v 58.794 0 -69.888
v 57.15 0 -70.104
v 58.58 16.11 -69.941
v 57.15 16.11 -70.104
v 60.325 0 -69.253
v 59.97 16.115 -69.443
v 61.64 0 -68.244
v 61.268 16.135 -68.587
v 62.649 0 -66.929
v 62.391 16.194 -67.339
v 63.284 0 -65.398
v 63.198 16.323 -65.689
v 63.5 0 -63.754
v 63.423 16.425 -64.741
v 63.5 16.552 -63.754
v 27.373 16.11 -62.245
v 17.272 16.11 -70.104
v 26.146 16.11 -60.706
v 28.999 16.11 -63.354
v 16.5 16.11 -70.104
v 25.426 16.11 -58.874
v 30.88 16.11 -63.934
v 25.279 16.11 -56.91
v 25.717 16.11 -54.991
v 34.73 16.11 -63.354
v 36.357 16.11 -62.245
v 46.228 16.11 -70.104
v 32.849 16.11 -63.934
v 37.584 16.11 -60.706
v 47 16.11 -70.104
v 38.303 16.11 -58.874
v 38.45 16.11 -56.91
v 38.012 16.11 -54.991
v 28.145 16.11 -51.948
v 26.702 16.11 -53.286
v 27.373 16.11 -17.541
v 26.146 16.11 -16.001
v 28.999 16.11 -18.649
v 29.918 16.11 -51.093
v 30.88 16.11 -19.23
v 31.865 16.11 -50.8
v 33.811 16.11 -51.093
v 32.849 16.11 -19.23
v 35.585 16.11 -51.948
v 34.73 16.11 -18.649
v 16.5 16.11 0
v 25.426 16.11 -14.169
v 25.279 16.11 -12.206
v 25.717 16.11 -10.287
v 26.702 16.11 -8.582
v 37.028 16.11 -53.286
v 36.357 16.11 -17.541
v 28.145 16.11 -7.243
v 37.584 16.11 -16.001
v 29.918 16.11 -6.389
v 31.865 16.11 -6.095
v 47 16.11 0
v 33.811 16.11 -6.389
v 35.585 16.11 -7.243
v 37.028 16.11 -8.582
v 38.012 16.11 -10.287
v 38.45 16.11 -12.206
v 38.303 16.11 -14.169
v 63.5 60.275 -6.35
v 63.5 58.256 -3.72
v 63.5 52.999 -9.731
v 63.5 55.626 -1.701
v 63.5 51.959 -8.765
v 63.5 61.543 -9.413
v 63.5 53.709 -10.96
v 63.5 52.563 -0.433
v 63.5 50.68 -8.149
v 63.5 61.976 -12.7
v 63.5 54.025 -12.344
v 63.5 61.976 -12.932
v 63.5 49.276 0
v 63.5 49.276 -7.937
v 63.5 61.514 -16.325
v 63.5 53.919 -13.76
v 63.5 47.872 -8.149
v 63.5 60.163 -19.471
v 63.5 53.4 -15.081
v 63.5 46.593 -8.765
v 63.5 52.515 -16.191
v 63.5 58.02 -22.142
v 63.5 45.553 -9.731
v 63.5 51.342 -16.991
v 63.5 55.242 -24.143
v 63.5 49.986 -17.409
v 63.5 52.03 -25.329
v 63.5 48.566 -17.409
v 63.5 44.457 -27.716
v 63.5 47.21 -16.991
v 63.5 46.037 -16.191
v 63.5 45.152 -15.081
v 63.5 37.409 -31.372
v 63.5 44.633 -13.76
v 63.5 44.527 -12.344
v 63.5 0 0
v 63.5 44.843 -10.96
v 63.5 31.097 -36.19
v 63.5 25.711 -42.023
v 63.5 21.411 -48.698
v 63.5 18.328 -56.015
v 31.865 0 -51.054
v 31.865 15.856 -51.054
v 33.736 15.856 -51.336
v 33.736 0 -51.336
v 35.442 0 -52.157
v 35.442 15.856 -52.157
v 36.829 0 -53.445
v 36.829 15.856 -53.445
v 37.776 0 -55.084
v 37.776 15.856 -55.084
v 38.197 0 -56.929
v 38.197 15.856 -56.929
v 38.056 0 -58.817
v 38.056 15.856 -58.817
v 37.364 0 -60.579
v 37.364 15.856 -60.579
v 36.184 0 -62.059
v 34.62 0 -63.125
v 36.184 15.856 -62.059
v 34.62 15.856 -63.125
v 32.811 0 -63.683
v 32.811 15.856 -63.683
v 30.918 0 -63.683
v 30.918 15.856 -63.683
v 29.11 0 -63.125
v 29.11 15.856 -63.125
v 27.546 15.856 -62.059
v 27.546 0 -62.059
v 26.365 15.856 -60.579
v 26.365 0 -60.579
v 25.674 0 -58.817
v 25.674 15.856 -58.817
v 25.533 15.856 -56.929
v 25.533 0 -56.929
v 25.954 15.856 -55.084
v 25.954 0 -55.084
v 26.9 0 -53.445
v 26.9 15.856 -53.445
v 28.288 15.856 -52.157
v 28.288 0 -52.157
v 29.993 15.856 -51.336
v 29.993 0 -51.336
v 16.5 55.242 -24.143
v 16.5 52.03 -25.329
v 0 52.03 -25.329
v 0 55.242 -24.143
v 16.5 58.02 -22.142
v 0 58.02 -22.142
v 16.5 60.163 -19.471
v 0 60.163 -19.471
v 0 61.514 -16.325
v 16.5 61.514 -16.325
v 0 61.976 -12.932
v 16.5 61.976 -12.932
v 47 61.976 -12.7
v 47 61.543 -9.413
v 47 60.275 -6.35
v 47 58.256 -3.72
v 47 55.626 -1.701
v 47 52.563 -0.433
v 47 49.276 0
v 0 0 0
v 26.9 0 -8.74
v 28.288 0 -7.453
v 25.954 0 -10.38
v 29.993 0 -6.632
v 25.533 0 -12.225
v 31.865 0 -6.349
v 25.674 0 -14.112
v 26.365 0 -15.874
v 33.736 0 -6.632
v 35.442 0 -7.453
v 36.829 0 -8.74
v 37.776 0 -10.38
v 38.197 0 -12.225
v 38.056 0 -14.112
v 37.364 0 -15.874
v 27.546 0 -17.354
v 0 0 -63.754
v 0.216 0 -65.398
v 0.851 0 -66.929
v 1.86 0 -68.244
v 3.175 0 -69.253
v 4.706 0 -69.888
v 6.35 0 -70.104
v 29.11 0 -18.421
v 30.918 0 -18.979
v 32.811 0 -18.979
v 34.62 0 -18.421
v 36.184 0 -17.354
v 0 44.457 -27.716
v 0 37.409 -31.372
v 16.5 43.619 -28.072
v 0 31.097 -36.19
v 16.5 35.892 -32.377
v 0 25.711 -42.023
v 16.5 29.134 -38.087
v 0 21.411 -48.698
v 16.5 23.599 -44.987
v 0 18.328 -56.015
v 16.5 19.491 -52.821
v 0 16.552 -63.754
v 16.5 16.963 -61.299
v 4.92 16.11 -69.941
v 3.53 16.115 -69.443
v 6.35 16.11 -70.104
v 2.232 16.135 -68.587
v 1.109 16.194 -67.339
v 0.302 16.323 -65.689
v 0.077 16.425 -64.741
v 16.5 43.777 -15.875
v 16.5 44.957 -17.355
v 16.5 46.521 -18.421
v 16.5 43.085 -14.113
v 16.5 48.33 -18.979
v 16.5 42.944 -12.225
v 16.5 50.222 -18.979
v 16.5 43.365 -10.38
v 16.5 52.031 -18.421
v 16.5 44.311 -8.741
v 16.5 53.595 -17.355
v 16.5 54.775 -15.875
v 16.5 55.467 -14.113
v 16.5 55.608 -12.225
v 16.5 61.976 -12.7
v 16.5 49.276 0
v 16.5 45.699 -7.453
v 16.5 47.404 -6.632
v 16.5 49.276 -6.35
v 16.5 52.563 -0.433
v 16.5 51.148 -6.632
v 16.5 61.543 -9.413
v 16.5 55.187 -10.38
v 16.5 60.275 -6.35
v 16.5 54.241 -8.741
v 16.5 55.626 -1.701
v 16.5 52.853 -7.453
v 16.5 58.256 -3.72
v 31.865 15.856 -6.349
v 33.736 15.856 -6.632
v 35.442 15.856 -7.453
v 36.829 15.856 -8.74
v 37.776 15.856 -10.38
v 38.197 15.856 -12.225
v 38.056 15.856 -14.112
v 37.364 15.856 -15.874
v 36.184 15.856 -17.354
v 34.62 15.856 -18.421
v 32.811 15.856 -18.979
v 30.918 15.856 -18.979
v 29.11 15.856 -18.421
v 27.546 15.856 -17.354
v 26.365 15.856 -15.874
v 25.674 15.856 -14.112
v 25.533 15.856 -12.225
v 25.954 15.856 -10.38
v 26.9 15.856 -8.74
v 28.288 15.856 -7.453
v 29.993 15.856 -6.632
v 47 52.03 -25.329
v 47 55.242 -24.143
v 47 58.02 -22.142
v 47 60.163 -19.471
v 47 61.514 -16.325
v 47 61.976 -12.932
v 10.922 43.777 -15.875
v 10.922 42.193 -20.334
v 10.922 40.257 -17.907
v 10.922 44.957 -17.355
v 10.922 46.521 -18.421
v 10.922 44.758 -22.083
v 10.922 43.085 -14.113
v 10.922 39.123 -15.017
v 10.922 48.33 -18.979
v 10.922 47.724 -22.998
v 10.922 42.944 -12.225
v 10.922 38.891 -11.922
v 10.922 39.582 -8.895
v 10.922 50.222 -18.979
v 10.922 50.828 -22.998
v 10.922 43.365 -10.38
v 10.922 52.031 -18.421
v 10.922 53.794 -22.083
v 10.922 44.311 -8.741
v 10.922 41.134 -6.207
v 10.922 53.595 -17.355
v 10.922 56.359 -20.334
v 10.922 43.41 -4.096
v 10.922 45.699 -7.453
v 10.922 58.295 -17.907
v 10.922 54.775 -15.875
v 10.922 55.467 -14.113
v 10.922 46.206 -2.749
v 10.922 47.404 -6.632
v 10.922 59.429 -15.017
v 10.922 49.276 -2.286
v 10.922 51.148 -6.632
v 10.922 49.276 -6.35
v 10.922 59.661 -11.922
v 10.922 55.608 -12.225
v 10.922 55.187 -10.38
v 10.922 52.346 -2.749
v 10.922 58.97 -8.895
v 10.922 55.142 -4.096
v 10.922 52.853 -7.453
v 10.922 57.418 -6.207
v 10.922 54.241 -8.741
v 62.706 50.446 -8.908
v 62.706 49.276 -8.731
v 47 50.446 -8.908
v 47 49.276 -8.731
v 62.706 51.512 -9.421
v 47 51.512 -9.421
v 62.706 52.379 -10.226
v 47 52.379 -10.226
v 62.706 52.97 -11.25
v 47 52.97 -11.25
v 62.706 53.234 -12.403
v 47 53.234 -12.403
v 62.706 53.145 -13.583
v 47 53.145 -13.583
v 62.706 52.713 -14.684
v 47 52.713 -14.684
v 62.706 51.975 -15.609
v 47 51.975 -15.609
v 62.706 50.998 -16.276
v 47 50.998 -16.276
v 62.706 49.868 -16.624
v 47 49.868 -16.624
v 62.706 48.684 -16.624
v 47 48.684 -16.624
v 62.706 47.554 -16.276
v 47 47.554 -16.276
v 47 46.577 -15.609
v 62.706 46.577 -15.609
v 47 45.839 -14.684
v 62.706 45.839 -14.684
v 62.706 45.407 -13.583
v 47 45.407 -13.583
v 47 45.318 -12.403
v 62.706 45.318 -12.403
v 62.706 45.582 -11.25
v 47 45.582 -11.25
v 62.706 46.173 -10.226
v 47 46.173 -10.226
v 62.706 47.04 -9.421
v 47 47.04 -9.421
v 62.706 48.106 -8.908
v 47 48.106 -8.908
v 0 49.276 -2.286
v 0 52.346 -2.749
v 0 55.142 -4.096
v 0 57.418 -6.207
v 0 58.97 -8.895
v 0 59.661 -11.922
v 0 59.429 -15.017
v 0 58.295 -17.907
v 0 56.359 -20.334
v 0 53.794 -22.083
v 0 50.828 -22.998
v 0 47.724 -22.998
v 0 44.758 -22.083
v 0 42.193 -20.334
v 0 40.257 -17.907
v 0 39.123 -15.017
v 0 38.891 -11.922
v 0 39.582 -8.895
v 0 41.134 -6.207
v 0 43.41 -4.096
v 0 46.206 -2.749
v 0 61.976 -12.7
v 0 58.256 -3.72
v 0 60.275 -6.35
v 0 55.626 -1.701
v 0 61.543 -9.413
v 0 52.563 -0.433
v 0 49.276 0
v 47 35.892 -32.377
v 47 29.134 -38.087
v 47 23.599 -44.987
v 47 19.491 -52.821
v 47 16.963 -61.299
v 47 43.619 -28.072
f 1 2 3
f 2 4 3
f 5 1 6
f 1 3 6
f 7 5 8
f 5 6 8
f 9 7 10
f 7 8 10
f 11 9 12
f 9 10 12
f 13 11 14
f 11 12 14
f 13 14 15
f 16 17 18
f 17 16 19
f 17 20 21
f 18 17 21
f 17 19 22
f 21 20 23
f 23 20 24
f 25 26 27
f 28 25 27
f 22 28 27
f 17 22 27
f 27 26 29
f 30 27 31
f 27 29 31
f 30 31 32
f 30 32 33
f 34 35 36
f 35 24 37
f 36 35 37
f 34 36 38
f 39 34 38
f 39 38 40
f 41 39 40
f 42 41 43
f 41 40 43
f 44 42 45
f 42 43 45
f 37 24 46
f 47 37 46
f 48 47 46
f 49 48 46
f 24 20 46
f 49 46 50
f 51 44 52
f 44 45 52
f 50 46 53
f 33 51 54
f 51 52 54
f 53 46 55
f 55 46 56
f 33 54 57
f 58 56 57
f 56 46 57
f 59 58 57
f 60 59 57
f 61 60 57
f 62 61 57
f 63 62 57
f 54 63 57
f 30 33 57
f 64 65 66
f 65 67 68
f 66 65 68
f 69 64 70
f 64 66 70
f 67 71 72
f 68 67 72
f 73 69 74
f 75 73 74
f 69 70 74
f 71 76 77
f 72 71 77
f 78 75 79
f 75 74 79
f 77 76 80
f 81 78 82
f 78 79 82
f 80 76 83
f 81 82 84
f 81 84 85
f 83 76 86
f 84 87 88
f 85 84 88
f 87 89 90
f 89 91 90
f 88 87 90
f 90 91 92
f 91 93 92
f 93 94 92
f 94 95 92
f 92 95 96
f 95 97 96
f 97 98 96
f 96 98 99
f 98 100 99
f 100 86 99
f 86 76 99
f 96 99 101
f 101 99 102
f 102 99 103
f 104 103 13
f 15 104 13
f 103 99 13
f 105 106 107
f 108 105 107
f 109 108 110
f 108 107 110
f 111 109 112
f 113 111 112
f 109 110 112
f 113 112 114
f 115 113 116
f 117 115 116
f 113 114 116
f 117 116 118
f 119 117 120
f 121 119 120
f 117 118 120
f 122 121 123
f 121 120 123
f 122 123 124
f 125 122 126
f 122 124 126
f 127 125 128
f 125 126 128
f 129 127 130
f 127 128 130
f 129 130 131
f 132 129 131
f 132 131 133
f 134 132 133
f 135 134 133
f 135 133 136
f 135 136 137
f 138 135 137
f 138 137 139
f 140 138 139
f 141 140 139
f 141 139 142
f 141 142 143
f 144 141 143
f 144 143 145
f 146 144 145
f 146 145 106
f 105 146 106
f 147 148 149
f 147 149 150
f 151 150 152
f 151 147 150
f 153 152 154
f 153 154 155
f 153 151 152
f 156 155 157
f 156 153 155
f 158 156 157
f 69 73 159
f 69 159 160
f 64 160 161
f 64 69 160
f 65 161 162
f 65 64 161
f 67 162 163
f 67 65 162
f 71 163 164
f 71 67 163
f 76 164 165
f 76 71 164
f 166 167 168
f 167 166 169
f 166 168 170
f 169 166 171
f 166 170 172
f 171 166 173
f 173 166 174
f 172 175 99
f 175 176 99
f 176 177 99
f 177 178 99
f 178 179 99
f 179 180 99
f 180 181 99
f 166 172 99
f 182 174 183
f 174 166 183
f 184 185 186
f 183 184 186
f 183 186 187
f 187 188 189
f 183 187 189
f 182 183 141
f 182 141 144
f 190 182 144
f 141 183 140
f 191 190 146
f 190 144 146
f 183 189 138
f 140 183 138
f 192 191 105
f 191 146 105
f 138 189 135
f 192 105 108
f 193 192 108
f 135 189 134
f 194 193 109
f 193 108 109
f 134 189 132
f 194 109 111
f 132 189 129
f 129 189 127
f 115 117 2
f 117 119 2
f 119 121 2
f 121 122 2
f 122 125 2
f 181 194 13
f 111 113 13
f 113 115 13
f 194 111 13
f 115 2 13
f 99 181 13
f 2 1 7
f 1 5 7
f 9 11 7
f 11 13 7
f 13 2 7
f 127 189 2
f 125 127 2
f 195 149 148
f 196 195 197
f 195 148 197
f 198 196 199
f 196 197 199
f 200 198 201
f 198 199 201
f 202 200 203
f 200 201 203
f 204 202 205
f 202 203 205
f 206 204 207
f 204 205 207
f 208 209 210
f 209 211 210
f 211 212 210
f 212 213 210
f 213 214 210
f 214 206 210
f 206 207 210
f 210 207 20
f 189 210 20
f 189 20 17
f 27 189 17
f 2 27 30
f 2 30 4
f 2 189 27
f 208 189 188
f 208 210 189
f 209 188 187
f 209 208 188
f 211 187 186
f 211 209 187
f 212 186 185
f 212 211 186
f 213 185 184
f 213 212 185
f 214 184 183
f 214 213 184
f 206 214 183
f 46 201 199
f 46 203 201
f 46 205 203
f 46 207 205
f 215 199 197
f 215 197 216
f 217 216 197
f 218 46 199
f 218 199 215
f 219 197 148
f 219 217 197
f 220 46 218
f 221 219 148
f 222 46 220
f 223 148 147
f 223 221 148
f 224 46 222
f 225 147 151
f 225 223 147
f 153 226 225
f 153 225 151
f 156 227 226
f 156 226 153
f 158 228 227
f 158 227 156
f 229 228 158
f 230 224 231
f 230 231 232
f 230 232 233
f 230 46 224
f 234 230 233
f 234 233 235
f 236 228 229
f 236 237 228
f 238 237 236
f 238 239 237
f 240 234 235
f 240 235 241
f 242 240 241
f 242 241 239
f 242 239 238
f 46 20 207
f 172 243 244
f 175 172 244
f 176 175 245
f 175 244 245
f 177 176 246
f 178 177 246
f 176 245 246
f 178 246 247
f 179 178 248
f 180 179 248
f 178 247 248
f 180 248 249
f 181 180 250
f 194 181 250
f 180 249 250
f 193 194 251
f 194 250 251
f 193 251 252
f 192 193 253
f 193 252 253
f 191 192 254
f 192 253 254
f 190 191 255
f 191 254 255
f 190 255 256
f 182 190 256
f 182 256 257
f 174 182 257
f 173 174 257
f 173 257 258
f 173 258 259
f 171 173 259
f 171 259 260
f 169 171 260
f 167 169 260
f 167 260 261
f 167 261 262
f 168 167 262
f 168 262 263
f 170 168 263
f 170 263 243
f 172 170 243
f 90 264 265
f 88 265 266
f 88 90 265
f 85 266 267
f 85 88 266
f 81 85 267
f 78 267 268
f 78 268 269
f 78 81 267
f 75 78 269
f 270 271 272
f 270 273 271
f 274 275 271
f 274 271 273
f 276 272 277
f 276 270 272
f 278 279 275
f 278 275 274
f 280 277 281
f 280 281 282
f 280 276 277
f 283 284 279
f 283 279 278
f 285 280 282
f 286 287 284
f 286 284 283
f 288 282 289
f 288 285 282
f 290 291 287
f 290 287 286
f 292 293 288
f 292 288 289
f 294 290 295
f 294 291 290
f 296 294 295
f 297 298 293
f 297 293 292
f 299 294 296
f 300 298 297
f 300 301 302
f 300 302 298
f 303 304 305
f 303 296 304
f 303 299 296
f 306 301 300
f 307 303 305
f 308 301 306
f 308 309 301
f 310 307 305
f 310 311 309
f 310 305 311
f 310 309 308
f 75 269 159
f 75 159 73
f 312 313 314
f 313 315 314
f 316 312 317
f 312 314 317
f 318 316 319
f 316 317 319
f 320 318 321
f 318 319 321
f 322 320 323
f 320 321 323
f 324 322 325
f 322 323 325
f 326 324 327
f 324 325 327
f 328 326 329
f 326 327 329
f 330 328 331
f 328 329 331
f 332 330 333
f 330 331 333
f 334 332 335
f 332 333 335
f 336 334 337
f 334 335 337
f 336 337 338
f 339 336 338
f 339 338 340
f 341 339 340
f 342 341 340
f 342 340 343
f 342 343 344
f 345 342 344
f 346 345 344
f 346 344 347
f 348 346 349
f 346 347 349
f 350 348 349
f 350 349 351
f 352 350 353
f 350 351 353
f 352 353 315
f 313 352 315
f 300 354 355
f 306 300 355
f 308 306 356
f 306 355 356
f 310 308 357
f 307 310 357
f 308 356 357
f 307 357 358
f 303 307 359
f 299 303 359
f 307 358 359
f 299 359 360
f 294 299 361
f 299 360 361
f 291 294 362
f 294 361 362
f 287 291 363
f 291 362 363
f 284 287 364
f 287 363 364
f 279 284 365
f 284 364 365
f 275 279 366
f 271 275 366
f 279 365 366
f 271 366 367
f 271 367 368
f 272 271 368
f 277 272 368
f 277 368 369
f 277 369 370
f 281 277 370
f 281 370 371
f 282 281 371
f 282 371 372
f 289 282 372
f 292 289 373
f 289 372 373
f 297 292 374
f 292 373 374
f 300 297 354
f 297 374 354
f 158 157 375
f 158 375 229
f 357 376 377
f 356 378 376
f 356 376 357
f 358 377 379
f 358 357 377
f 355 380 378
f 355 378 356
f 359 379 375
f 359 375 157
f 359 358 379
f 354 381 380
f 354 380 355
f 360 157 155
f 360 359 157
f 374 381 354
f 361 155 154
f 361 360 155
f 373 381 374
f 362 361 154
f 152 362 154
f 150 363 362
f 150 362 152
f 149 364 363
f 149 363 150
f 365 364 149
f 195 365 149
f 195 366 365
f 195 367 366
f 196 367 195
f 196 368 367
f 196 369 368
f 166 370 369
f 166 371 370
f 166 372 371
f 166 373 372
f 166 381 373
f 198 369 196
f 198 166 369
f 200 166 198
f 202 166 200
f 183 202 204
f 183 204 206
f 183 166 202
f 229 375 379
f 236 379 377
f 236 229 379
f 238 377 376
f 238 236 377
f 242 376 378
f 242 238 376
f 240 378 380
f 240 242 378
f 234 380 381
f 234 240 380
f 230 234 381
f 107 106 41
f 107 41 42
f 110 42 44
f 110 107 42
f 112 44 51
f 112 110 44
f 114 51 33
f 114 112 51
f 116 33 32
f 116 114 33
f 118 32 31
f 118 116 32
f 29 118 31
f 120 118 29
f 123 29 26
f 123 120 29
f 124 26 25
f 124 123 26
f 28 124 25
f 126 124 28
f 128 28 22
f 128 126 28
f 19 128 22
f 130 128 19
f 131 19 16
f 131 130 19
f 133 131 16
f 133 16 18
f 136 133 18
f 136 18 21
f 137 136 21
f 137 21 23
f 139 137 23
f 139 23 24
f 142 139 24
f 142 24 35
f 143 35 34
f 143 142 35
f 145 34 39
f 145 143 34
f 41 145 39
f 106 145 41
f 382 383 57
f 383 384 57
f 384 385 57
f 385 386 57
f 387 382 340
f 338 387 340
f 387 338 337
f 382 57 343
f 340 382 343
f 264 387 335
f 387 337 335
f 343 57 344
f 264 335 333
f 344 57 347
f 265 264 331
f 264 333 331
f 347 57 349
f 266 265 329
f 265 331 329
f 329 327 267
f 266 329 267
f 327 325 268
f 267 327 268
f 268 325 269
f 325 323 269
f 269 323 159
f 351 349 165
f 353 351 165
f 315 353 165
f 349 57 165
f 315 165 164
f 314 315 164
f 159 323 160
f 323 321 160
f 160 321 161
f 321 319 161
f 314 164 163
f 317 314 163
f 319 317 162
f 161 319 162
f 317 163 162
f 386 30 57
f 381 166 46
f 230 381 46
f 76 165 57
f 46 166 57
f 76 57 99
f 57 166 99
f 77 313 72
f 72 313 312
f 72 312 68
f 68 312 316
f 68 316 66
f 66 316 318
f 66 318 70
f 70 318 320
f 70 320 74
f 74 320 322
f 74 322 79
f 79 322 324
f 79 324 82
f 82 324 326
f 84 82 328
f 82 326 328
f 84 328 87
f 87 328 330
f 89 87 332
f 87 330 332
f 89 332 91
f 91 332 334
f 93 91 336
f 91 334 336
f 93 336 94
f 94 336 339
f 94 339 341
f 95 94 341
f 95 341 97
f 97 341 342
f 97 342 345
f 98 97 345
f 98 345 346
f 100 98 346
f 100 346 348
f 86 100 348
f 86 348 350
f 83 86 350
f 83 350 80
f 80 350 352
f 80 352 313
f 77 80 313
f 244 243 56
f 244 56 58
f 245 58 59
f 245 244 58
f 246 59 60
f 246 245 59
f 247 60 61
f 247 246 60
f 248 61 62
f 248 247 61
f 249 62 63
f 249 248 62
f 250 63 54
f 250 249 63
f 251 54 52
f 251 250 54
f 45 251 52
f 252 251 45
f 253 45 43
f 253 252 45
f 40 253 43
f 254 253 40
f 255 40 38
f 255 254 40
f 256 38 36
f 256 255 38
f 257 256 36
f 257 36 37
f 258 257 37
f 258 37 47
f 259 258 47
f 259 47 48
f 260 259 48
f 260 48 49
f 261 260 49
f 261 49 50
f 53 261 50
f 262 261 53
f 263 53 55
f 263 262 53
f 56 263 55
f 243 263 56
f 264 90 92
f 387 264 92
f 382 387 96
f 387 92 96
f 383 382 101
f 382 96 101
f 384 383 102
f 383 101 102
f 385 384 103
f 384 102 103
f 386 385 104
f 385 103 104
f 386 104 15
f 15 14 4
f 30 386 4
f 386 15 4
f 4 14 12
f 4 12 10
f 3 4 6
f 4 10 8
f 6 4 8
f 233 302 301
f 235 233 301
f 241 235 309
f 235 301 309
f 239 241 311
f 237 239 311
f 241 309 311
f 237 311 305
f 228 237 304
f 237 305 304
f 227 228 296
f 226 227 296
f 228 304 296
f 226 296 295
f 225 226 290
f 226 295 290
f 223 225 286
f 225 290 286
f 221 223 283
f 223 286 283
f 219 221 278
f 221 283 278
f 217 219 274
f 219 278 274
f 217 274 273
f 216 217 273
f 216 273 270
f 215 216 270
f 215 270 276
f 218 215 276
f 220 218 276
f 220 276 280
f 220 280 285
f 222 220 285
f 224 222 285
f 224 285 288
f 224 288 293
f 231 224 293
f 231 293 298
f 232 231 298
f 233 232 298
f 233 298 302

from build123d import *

# Parameters (mm, degrees)
SKETCH1_W                         = 63.5
SKETCH1_H                         = 70.104
BOSS_EXTRUDE1_DEPTH               = 61.976
SKETCH2_R                         = 45.865892013
CUT_EXTRUDE1_DEPTH                = 63.5
FILLET2_R                         = 12.7
SKETCH3_W                         = 28.956
SKETCH3_H                         = 47.389892013
CUT_EXTRUDE2_DEPTH                = 71.104
SKETCH4_R                         = 6.35
CUT_EXTRUDE3_DEPTH                = 17.110107987
CHAMFER1_SIZE                     = 0.254
FILLET4_R                         = 6.35
SKETCH5_R                         = 10.414
CUT_EXTRUDE4_DEPTH                = 10.922
CUT_EXTRUDE5_REACH                = 54.578
SKETCH6_R                         = 6.35
F_3_8_16_TAPPED_HOLE1_D           = 7.9375
F_3_8_16_TAPPED_HOLE1_DEPTH       = 17.272
F_3_8_16_TAPPED_HOLE1_CSINK_D     = 9.525
F_3_8_16_TAPPED_HOLE1_CSINK_ANGLE = 90
SKETCH9_W                         = 30.5
SKETCH9_H                         = 45.865892013
CUT_EXTRUDE6_DEPTH                = 71.1040001


with BuildPart() as part:
    # Sketch1 → Boss-Extrude1 (new body)
    with BuildSketch(Plane(origin=(0, 0, 0), x_dir=(1, 0, 0), z_dir=(0, 1, 0))):
        with Locations((31.75, 35.052)):
            Rectangle(SKETCH1_W, SKETCH1_H)
    extrude(amount=BOSS_EXTRUDE1_DEPTH)

    # Sketch2 → Cut-Extrude1 (cut)
    with BuildSketch(Plane(origin=(63.5, 0, 0), x_dir=(0, 0, -1), z_dir=(1, 0, 0))):
        with Locations((70.104, 61.976)):
            Circle(SKETCH2_R)
    extrude(amount=-CUT_EXTRUDE1_DEPTH, mode=Mode.SUBTRACT)

    # Fillet2
    fillet2_edges = [part.edges().sort_by_distance(p)[0] for p in [
        (31.75, 61.976, -24.238107987),
        (31.75, 61.976, 0),
    ]]
    fillet(fillet2_edges, radius=FILLET2_R)

    # Sketch3 → Cut-Extrude2 (cut, through all)
    with BuildSketch(Plane(origin=(0, 0, -70.104), x_dir=(-1, 0, 0), z_dir=(0, 0, -1))):
        with Locations((-31.75, 39.805053994)):
            Rectangle(SKETCH3_W, SKETCH3_H)
    extrude(amount=-CUT_EXTRUDE2_DEPTH, mode=Mode.SUBTRACT)

    # Sketch4 → Cut-Extrude3 (cut, through all)
    with BuildSketch(Plane(origin=(0, 16.110107987, 0), x_dir=(1, 0, 0), z_dir=(0, 1, 0))):
        with Locations(Location((31.864756847, 57.404, 0), (0, 0, 270))):  # turned: the seam where the file's is
            Circle(SKETCH4_R)
        with Locations(Location((31.864752163, 12.699481562, 0), (0, 0, 270))):  # turned: the seam where the file's is
            Circle(SKETCH4_R)
    extrude(amount=-CUT_EXTRUDE3_DEPTH, mode=Mode.SUBTRACT)

    # Chamfer1
    chamfer1_edges = [part.edges().sort_by_distance(p)[0] for p in [
        (31.864756847, 16.110107987, -63.754),
        (31.864752163, 16.110107987, -19.049481562),
    ]]
    chamfer(chamfer1_edges, length=CHAMFER1_SIZE)

    # Fillet4
    fillet4_edges = [part.edges().sort_by_distance(p)[0] for p in [
        (0, 8.055053993, -70.104),
        (63.5, 8.055053993, -70.104),
    ]]
    fillet(fillet4_edges, radius=FILLET4_R)

    # Sketch5 → Cut-Extrude4 (cut)
    with BuildSketch(Plane.ZY):
        with Locations((-12.7, 49.276)):
            Circle(SKETCH5_R)
    extrude(amount=-CUT_EXTRUDE4_DEPTH, mode=Mode.SUBTRACT)

    # Sketch6 → Cut-Extrude5 (cut, up to next)
    with BuildSketch(Plane.ZY.offset(-10.922), mode=Mode.PRIVATE) as cut_extrude5_sk1:
        with Locations((-12.7, 49.276)):
            Circle(SKETCH6_R)
    cut_extrude5_tool1 = extrude(cut_extrude5_sk1.sketch, amount=-CUT_EXTRUDE5_REACH, mode=Mode.PRIVATE) & part.part
    add(cut_extrude5_tool1.solids().sort_by_distance((10.922, 49.276, -12.7))[0], mode=Mode.SUBTRACT)

    # 3/8-16 Tapped Hole1
    with Locations(Plane(origin=(63.5, 0, 0), x_dir=(0, 0, -1), z_dir=(1, 0, 0))):
        with Locations((12.7, 49.276)):
            CounterSinkHole(F_3_8_16_TAPPED_HOLE1_D / 2, F_3_8_16_TAPPED_HOLE1_CSINK_D / 2, depth=F_3_8_16_TAPPED_HOLE1_DEPTH, counter_sink_angle=F_3_8_16_TAPPED_HOLE1_CSINK_ANGLE)

    # Sketch9 → Cut-Extrude6 (cut, through all)
    with BuildSketch(Plane.XY):
        with Locations((31.75, 39.043053994)):
            Rectangle(SKETCH9_W, SKETCH9_H)
    extrude(amount=-CUT_EXTRUDE6_DEPTH, mode=Mode.SUBTRACT)


solid = part.part
